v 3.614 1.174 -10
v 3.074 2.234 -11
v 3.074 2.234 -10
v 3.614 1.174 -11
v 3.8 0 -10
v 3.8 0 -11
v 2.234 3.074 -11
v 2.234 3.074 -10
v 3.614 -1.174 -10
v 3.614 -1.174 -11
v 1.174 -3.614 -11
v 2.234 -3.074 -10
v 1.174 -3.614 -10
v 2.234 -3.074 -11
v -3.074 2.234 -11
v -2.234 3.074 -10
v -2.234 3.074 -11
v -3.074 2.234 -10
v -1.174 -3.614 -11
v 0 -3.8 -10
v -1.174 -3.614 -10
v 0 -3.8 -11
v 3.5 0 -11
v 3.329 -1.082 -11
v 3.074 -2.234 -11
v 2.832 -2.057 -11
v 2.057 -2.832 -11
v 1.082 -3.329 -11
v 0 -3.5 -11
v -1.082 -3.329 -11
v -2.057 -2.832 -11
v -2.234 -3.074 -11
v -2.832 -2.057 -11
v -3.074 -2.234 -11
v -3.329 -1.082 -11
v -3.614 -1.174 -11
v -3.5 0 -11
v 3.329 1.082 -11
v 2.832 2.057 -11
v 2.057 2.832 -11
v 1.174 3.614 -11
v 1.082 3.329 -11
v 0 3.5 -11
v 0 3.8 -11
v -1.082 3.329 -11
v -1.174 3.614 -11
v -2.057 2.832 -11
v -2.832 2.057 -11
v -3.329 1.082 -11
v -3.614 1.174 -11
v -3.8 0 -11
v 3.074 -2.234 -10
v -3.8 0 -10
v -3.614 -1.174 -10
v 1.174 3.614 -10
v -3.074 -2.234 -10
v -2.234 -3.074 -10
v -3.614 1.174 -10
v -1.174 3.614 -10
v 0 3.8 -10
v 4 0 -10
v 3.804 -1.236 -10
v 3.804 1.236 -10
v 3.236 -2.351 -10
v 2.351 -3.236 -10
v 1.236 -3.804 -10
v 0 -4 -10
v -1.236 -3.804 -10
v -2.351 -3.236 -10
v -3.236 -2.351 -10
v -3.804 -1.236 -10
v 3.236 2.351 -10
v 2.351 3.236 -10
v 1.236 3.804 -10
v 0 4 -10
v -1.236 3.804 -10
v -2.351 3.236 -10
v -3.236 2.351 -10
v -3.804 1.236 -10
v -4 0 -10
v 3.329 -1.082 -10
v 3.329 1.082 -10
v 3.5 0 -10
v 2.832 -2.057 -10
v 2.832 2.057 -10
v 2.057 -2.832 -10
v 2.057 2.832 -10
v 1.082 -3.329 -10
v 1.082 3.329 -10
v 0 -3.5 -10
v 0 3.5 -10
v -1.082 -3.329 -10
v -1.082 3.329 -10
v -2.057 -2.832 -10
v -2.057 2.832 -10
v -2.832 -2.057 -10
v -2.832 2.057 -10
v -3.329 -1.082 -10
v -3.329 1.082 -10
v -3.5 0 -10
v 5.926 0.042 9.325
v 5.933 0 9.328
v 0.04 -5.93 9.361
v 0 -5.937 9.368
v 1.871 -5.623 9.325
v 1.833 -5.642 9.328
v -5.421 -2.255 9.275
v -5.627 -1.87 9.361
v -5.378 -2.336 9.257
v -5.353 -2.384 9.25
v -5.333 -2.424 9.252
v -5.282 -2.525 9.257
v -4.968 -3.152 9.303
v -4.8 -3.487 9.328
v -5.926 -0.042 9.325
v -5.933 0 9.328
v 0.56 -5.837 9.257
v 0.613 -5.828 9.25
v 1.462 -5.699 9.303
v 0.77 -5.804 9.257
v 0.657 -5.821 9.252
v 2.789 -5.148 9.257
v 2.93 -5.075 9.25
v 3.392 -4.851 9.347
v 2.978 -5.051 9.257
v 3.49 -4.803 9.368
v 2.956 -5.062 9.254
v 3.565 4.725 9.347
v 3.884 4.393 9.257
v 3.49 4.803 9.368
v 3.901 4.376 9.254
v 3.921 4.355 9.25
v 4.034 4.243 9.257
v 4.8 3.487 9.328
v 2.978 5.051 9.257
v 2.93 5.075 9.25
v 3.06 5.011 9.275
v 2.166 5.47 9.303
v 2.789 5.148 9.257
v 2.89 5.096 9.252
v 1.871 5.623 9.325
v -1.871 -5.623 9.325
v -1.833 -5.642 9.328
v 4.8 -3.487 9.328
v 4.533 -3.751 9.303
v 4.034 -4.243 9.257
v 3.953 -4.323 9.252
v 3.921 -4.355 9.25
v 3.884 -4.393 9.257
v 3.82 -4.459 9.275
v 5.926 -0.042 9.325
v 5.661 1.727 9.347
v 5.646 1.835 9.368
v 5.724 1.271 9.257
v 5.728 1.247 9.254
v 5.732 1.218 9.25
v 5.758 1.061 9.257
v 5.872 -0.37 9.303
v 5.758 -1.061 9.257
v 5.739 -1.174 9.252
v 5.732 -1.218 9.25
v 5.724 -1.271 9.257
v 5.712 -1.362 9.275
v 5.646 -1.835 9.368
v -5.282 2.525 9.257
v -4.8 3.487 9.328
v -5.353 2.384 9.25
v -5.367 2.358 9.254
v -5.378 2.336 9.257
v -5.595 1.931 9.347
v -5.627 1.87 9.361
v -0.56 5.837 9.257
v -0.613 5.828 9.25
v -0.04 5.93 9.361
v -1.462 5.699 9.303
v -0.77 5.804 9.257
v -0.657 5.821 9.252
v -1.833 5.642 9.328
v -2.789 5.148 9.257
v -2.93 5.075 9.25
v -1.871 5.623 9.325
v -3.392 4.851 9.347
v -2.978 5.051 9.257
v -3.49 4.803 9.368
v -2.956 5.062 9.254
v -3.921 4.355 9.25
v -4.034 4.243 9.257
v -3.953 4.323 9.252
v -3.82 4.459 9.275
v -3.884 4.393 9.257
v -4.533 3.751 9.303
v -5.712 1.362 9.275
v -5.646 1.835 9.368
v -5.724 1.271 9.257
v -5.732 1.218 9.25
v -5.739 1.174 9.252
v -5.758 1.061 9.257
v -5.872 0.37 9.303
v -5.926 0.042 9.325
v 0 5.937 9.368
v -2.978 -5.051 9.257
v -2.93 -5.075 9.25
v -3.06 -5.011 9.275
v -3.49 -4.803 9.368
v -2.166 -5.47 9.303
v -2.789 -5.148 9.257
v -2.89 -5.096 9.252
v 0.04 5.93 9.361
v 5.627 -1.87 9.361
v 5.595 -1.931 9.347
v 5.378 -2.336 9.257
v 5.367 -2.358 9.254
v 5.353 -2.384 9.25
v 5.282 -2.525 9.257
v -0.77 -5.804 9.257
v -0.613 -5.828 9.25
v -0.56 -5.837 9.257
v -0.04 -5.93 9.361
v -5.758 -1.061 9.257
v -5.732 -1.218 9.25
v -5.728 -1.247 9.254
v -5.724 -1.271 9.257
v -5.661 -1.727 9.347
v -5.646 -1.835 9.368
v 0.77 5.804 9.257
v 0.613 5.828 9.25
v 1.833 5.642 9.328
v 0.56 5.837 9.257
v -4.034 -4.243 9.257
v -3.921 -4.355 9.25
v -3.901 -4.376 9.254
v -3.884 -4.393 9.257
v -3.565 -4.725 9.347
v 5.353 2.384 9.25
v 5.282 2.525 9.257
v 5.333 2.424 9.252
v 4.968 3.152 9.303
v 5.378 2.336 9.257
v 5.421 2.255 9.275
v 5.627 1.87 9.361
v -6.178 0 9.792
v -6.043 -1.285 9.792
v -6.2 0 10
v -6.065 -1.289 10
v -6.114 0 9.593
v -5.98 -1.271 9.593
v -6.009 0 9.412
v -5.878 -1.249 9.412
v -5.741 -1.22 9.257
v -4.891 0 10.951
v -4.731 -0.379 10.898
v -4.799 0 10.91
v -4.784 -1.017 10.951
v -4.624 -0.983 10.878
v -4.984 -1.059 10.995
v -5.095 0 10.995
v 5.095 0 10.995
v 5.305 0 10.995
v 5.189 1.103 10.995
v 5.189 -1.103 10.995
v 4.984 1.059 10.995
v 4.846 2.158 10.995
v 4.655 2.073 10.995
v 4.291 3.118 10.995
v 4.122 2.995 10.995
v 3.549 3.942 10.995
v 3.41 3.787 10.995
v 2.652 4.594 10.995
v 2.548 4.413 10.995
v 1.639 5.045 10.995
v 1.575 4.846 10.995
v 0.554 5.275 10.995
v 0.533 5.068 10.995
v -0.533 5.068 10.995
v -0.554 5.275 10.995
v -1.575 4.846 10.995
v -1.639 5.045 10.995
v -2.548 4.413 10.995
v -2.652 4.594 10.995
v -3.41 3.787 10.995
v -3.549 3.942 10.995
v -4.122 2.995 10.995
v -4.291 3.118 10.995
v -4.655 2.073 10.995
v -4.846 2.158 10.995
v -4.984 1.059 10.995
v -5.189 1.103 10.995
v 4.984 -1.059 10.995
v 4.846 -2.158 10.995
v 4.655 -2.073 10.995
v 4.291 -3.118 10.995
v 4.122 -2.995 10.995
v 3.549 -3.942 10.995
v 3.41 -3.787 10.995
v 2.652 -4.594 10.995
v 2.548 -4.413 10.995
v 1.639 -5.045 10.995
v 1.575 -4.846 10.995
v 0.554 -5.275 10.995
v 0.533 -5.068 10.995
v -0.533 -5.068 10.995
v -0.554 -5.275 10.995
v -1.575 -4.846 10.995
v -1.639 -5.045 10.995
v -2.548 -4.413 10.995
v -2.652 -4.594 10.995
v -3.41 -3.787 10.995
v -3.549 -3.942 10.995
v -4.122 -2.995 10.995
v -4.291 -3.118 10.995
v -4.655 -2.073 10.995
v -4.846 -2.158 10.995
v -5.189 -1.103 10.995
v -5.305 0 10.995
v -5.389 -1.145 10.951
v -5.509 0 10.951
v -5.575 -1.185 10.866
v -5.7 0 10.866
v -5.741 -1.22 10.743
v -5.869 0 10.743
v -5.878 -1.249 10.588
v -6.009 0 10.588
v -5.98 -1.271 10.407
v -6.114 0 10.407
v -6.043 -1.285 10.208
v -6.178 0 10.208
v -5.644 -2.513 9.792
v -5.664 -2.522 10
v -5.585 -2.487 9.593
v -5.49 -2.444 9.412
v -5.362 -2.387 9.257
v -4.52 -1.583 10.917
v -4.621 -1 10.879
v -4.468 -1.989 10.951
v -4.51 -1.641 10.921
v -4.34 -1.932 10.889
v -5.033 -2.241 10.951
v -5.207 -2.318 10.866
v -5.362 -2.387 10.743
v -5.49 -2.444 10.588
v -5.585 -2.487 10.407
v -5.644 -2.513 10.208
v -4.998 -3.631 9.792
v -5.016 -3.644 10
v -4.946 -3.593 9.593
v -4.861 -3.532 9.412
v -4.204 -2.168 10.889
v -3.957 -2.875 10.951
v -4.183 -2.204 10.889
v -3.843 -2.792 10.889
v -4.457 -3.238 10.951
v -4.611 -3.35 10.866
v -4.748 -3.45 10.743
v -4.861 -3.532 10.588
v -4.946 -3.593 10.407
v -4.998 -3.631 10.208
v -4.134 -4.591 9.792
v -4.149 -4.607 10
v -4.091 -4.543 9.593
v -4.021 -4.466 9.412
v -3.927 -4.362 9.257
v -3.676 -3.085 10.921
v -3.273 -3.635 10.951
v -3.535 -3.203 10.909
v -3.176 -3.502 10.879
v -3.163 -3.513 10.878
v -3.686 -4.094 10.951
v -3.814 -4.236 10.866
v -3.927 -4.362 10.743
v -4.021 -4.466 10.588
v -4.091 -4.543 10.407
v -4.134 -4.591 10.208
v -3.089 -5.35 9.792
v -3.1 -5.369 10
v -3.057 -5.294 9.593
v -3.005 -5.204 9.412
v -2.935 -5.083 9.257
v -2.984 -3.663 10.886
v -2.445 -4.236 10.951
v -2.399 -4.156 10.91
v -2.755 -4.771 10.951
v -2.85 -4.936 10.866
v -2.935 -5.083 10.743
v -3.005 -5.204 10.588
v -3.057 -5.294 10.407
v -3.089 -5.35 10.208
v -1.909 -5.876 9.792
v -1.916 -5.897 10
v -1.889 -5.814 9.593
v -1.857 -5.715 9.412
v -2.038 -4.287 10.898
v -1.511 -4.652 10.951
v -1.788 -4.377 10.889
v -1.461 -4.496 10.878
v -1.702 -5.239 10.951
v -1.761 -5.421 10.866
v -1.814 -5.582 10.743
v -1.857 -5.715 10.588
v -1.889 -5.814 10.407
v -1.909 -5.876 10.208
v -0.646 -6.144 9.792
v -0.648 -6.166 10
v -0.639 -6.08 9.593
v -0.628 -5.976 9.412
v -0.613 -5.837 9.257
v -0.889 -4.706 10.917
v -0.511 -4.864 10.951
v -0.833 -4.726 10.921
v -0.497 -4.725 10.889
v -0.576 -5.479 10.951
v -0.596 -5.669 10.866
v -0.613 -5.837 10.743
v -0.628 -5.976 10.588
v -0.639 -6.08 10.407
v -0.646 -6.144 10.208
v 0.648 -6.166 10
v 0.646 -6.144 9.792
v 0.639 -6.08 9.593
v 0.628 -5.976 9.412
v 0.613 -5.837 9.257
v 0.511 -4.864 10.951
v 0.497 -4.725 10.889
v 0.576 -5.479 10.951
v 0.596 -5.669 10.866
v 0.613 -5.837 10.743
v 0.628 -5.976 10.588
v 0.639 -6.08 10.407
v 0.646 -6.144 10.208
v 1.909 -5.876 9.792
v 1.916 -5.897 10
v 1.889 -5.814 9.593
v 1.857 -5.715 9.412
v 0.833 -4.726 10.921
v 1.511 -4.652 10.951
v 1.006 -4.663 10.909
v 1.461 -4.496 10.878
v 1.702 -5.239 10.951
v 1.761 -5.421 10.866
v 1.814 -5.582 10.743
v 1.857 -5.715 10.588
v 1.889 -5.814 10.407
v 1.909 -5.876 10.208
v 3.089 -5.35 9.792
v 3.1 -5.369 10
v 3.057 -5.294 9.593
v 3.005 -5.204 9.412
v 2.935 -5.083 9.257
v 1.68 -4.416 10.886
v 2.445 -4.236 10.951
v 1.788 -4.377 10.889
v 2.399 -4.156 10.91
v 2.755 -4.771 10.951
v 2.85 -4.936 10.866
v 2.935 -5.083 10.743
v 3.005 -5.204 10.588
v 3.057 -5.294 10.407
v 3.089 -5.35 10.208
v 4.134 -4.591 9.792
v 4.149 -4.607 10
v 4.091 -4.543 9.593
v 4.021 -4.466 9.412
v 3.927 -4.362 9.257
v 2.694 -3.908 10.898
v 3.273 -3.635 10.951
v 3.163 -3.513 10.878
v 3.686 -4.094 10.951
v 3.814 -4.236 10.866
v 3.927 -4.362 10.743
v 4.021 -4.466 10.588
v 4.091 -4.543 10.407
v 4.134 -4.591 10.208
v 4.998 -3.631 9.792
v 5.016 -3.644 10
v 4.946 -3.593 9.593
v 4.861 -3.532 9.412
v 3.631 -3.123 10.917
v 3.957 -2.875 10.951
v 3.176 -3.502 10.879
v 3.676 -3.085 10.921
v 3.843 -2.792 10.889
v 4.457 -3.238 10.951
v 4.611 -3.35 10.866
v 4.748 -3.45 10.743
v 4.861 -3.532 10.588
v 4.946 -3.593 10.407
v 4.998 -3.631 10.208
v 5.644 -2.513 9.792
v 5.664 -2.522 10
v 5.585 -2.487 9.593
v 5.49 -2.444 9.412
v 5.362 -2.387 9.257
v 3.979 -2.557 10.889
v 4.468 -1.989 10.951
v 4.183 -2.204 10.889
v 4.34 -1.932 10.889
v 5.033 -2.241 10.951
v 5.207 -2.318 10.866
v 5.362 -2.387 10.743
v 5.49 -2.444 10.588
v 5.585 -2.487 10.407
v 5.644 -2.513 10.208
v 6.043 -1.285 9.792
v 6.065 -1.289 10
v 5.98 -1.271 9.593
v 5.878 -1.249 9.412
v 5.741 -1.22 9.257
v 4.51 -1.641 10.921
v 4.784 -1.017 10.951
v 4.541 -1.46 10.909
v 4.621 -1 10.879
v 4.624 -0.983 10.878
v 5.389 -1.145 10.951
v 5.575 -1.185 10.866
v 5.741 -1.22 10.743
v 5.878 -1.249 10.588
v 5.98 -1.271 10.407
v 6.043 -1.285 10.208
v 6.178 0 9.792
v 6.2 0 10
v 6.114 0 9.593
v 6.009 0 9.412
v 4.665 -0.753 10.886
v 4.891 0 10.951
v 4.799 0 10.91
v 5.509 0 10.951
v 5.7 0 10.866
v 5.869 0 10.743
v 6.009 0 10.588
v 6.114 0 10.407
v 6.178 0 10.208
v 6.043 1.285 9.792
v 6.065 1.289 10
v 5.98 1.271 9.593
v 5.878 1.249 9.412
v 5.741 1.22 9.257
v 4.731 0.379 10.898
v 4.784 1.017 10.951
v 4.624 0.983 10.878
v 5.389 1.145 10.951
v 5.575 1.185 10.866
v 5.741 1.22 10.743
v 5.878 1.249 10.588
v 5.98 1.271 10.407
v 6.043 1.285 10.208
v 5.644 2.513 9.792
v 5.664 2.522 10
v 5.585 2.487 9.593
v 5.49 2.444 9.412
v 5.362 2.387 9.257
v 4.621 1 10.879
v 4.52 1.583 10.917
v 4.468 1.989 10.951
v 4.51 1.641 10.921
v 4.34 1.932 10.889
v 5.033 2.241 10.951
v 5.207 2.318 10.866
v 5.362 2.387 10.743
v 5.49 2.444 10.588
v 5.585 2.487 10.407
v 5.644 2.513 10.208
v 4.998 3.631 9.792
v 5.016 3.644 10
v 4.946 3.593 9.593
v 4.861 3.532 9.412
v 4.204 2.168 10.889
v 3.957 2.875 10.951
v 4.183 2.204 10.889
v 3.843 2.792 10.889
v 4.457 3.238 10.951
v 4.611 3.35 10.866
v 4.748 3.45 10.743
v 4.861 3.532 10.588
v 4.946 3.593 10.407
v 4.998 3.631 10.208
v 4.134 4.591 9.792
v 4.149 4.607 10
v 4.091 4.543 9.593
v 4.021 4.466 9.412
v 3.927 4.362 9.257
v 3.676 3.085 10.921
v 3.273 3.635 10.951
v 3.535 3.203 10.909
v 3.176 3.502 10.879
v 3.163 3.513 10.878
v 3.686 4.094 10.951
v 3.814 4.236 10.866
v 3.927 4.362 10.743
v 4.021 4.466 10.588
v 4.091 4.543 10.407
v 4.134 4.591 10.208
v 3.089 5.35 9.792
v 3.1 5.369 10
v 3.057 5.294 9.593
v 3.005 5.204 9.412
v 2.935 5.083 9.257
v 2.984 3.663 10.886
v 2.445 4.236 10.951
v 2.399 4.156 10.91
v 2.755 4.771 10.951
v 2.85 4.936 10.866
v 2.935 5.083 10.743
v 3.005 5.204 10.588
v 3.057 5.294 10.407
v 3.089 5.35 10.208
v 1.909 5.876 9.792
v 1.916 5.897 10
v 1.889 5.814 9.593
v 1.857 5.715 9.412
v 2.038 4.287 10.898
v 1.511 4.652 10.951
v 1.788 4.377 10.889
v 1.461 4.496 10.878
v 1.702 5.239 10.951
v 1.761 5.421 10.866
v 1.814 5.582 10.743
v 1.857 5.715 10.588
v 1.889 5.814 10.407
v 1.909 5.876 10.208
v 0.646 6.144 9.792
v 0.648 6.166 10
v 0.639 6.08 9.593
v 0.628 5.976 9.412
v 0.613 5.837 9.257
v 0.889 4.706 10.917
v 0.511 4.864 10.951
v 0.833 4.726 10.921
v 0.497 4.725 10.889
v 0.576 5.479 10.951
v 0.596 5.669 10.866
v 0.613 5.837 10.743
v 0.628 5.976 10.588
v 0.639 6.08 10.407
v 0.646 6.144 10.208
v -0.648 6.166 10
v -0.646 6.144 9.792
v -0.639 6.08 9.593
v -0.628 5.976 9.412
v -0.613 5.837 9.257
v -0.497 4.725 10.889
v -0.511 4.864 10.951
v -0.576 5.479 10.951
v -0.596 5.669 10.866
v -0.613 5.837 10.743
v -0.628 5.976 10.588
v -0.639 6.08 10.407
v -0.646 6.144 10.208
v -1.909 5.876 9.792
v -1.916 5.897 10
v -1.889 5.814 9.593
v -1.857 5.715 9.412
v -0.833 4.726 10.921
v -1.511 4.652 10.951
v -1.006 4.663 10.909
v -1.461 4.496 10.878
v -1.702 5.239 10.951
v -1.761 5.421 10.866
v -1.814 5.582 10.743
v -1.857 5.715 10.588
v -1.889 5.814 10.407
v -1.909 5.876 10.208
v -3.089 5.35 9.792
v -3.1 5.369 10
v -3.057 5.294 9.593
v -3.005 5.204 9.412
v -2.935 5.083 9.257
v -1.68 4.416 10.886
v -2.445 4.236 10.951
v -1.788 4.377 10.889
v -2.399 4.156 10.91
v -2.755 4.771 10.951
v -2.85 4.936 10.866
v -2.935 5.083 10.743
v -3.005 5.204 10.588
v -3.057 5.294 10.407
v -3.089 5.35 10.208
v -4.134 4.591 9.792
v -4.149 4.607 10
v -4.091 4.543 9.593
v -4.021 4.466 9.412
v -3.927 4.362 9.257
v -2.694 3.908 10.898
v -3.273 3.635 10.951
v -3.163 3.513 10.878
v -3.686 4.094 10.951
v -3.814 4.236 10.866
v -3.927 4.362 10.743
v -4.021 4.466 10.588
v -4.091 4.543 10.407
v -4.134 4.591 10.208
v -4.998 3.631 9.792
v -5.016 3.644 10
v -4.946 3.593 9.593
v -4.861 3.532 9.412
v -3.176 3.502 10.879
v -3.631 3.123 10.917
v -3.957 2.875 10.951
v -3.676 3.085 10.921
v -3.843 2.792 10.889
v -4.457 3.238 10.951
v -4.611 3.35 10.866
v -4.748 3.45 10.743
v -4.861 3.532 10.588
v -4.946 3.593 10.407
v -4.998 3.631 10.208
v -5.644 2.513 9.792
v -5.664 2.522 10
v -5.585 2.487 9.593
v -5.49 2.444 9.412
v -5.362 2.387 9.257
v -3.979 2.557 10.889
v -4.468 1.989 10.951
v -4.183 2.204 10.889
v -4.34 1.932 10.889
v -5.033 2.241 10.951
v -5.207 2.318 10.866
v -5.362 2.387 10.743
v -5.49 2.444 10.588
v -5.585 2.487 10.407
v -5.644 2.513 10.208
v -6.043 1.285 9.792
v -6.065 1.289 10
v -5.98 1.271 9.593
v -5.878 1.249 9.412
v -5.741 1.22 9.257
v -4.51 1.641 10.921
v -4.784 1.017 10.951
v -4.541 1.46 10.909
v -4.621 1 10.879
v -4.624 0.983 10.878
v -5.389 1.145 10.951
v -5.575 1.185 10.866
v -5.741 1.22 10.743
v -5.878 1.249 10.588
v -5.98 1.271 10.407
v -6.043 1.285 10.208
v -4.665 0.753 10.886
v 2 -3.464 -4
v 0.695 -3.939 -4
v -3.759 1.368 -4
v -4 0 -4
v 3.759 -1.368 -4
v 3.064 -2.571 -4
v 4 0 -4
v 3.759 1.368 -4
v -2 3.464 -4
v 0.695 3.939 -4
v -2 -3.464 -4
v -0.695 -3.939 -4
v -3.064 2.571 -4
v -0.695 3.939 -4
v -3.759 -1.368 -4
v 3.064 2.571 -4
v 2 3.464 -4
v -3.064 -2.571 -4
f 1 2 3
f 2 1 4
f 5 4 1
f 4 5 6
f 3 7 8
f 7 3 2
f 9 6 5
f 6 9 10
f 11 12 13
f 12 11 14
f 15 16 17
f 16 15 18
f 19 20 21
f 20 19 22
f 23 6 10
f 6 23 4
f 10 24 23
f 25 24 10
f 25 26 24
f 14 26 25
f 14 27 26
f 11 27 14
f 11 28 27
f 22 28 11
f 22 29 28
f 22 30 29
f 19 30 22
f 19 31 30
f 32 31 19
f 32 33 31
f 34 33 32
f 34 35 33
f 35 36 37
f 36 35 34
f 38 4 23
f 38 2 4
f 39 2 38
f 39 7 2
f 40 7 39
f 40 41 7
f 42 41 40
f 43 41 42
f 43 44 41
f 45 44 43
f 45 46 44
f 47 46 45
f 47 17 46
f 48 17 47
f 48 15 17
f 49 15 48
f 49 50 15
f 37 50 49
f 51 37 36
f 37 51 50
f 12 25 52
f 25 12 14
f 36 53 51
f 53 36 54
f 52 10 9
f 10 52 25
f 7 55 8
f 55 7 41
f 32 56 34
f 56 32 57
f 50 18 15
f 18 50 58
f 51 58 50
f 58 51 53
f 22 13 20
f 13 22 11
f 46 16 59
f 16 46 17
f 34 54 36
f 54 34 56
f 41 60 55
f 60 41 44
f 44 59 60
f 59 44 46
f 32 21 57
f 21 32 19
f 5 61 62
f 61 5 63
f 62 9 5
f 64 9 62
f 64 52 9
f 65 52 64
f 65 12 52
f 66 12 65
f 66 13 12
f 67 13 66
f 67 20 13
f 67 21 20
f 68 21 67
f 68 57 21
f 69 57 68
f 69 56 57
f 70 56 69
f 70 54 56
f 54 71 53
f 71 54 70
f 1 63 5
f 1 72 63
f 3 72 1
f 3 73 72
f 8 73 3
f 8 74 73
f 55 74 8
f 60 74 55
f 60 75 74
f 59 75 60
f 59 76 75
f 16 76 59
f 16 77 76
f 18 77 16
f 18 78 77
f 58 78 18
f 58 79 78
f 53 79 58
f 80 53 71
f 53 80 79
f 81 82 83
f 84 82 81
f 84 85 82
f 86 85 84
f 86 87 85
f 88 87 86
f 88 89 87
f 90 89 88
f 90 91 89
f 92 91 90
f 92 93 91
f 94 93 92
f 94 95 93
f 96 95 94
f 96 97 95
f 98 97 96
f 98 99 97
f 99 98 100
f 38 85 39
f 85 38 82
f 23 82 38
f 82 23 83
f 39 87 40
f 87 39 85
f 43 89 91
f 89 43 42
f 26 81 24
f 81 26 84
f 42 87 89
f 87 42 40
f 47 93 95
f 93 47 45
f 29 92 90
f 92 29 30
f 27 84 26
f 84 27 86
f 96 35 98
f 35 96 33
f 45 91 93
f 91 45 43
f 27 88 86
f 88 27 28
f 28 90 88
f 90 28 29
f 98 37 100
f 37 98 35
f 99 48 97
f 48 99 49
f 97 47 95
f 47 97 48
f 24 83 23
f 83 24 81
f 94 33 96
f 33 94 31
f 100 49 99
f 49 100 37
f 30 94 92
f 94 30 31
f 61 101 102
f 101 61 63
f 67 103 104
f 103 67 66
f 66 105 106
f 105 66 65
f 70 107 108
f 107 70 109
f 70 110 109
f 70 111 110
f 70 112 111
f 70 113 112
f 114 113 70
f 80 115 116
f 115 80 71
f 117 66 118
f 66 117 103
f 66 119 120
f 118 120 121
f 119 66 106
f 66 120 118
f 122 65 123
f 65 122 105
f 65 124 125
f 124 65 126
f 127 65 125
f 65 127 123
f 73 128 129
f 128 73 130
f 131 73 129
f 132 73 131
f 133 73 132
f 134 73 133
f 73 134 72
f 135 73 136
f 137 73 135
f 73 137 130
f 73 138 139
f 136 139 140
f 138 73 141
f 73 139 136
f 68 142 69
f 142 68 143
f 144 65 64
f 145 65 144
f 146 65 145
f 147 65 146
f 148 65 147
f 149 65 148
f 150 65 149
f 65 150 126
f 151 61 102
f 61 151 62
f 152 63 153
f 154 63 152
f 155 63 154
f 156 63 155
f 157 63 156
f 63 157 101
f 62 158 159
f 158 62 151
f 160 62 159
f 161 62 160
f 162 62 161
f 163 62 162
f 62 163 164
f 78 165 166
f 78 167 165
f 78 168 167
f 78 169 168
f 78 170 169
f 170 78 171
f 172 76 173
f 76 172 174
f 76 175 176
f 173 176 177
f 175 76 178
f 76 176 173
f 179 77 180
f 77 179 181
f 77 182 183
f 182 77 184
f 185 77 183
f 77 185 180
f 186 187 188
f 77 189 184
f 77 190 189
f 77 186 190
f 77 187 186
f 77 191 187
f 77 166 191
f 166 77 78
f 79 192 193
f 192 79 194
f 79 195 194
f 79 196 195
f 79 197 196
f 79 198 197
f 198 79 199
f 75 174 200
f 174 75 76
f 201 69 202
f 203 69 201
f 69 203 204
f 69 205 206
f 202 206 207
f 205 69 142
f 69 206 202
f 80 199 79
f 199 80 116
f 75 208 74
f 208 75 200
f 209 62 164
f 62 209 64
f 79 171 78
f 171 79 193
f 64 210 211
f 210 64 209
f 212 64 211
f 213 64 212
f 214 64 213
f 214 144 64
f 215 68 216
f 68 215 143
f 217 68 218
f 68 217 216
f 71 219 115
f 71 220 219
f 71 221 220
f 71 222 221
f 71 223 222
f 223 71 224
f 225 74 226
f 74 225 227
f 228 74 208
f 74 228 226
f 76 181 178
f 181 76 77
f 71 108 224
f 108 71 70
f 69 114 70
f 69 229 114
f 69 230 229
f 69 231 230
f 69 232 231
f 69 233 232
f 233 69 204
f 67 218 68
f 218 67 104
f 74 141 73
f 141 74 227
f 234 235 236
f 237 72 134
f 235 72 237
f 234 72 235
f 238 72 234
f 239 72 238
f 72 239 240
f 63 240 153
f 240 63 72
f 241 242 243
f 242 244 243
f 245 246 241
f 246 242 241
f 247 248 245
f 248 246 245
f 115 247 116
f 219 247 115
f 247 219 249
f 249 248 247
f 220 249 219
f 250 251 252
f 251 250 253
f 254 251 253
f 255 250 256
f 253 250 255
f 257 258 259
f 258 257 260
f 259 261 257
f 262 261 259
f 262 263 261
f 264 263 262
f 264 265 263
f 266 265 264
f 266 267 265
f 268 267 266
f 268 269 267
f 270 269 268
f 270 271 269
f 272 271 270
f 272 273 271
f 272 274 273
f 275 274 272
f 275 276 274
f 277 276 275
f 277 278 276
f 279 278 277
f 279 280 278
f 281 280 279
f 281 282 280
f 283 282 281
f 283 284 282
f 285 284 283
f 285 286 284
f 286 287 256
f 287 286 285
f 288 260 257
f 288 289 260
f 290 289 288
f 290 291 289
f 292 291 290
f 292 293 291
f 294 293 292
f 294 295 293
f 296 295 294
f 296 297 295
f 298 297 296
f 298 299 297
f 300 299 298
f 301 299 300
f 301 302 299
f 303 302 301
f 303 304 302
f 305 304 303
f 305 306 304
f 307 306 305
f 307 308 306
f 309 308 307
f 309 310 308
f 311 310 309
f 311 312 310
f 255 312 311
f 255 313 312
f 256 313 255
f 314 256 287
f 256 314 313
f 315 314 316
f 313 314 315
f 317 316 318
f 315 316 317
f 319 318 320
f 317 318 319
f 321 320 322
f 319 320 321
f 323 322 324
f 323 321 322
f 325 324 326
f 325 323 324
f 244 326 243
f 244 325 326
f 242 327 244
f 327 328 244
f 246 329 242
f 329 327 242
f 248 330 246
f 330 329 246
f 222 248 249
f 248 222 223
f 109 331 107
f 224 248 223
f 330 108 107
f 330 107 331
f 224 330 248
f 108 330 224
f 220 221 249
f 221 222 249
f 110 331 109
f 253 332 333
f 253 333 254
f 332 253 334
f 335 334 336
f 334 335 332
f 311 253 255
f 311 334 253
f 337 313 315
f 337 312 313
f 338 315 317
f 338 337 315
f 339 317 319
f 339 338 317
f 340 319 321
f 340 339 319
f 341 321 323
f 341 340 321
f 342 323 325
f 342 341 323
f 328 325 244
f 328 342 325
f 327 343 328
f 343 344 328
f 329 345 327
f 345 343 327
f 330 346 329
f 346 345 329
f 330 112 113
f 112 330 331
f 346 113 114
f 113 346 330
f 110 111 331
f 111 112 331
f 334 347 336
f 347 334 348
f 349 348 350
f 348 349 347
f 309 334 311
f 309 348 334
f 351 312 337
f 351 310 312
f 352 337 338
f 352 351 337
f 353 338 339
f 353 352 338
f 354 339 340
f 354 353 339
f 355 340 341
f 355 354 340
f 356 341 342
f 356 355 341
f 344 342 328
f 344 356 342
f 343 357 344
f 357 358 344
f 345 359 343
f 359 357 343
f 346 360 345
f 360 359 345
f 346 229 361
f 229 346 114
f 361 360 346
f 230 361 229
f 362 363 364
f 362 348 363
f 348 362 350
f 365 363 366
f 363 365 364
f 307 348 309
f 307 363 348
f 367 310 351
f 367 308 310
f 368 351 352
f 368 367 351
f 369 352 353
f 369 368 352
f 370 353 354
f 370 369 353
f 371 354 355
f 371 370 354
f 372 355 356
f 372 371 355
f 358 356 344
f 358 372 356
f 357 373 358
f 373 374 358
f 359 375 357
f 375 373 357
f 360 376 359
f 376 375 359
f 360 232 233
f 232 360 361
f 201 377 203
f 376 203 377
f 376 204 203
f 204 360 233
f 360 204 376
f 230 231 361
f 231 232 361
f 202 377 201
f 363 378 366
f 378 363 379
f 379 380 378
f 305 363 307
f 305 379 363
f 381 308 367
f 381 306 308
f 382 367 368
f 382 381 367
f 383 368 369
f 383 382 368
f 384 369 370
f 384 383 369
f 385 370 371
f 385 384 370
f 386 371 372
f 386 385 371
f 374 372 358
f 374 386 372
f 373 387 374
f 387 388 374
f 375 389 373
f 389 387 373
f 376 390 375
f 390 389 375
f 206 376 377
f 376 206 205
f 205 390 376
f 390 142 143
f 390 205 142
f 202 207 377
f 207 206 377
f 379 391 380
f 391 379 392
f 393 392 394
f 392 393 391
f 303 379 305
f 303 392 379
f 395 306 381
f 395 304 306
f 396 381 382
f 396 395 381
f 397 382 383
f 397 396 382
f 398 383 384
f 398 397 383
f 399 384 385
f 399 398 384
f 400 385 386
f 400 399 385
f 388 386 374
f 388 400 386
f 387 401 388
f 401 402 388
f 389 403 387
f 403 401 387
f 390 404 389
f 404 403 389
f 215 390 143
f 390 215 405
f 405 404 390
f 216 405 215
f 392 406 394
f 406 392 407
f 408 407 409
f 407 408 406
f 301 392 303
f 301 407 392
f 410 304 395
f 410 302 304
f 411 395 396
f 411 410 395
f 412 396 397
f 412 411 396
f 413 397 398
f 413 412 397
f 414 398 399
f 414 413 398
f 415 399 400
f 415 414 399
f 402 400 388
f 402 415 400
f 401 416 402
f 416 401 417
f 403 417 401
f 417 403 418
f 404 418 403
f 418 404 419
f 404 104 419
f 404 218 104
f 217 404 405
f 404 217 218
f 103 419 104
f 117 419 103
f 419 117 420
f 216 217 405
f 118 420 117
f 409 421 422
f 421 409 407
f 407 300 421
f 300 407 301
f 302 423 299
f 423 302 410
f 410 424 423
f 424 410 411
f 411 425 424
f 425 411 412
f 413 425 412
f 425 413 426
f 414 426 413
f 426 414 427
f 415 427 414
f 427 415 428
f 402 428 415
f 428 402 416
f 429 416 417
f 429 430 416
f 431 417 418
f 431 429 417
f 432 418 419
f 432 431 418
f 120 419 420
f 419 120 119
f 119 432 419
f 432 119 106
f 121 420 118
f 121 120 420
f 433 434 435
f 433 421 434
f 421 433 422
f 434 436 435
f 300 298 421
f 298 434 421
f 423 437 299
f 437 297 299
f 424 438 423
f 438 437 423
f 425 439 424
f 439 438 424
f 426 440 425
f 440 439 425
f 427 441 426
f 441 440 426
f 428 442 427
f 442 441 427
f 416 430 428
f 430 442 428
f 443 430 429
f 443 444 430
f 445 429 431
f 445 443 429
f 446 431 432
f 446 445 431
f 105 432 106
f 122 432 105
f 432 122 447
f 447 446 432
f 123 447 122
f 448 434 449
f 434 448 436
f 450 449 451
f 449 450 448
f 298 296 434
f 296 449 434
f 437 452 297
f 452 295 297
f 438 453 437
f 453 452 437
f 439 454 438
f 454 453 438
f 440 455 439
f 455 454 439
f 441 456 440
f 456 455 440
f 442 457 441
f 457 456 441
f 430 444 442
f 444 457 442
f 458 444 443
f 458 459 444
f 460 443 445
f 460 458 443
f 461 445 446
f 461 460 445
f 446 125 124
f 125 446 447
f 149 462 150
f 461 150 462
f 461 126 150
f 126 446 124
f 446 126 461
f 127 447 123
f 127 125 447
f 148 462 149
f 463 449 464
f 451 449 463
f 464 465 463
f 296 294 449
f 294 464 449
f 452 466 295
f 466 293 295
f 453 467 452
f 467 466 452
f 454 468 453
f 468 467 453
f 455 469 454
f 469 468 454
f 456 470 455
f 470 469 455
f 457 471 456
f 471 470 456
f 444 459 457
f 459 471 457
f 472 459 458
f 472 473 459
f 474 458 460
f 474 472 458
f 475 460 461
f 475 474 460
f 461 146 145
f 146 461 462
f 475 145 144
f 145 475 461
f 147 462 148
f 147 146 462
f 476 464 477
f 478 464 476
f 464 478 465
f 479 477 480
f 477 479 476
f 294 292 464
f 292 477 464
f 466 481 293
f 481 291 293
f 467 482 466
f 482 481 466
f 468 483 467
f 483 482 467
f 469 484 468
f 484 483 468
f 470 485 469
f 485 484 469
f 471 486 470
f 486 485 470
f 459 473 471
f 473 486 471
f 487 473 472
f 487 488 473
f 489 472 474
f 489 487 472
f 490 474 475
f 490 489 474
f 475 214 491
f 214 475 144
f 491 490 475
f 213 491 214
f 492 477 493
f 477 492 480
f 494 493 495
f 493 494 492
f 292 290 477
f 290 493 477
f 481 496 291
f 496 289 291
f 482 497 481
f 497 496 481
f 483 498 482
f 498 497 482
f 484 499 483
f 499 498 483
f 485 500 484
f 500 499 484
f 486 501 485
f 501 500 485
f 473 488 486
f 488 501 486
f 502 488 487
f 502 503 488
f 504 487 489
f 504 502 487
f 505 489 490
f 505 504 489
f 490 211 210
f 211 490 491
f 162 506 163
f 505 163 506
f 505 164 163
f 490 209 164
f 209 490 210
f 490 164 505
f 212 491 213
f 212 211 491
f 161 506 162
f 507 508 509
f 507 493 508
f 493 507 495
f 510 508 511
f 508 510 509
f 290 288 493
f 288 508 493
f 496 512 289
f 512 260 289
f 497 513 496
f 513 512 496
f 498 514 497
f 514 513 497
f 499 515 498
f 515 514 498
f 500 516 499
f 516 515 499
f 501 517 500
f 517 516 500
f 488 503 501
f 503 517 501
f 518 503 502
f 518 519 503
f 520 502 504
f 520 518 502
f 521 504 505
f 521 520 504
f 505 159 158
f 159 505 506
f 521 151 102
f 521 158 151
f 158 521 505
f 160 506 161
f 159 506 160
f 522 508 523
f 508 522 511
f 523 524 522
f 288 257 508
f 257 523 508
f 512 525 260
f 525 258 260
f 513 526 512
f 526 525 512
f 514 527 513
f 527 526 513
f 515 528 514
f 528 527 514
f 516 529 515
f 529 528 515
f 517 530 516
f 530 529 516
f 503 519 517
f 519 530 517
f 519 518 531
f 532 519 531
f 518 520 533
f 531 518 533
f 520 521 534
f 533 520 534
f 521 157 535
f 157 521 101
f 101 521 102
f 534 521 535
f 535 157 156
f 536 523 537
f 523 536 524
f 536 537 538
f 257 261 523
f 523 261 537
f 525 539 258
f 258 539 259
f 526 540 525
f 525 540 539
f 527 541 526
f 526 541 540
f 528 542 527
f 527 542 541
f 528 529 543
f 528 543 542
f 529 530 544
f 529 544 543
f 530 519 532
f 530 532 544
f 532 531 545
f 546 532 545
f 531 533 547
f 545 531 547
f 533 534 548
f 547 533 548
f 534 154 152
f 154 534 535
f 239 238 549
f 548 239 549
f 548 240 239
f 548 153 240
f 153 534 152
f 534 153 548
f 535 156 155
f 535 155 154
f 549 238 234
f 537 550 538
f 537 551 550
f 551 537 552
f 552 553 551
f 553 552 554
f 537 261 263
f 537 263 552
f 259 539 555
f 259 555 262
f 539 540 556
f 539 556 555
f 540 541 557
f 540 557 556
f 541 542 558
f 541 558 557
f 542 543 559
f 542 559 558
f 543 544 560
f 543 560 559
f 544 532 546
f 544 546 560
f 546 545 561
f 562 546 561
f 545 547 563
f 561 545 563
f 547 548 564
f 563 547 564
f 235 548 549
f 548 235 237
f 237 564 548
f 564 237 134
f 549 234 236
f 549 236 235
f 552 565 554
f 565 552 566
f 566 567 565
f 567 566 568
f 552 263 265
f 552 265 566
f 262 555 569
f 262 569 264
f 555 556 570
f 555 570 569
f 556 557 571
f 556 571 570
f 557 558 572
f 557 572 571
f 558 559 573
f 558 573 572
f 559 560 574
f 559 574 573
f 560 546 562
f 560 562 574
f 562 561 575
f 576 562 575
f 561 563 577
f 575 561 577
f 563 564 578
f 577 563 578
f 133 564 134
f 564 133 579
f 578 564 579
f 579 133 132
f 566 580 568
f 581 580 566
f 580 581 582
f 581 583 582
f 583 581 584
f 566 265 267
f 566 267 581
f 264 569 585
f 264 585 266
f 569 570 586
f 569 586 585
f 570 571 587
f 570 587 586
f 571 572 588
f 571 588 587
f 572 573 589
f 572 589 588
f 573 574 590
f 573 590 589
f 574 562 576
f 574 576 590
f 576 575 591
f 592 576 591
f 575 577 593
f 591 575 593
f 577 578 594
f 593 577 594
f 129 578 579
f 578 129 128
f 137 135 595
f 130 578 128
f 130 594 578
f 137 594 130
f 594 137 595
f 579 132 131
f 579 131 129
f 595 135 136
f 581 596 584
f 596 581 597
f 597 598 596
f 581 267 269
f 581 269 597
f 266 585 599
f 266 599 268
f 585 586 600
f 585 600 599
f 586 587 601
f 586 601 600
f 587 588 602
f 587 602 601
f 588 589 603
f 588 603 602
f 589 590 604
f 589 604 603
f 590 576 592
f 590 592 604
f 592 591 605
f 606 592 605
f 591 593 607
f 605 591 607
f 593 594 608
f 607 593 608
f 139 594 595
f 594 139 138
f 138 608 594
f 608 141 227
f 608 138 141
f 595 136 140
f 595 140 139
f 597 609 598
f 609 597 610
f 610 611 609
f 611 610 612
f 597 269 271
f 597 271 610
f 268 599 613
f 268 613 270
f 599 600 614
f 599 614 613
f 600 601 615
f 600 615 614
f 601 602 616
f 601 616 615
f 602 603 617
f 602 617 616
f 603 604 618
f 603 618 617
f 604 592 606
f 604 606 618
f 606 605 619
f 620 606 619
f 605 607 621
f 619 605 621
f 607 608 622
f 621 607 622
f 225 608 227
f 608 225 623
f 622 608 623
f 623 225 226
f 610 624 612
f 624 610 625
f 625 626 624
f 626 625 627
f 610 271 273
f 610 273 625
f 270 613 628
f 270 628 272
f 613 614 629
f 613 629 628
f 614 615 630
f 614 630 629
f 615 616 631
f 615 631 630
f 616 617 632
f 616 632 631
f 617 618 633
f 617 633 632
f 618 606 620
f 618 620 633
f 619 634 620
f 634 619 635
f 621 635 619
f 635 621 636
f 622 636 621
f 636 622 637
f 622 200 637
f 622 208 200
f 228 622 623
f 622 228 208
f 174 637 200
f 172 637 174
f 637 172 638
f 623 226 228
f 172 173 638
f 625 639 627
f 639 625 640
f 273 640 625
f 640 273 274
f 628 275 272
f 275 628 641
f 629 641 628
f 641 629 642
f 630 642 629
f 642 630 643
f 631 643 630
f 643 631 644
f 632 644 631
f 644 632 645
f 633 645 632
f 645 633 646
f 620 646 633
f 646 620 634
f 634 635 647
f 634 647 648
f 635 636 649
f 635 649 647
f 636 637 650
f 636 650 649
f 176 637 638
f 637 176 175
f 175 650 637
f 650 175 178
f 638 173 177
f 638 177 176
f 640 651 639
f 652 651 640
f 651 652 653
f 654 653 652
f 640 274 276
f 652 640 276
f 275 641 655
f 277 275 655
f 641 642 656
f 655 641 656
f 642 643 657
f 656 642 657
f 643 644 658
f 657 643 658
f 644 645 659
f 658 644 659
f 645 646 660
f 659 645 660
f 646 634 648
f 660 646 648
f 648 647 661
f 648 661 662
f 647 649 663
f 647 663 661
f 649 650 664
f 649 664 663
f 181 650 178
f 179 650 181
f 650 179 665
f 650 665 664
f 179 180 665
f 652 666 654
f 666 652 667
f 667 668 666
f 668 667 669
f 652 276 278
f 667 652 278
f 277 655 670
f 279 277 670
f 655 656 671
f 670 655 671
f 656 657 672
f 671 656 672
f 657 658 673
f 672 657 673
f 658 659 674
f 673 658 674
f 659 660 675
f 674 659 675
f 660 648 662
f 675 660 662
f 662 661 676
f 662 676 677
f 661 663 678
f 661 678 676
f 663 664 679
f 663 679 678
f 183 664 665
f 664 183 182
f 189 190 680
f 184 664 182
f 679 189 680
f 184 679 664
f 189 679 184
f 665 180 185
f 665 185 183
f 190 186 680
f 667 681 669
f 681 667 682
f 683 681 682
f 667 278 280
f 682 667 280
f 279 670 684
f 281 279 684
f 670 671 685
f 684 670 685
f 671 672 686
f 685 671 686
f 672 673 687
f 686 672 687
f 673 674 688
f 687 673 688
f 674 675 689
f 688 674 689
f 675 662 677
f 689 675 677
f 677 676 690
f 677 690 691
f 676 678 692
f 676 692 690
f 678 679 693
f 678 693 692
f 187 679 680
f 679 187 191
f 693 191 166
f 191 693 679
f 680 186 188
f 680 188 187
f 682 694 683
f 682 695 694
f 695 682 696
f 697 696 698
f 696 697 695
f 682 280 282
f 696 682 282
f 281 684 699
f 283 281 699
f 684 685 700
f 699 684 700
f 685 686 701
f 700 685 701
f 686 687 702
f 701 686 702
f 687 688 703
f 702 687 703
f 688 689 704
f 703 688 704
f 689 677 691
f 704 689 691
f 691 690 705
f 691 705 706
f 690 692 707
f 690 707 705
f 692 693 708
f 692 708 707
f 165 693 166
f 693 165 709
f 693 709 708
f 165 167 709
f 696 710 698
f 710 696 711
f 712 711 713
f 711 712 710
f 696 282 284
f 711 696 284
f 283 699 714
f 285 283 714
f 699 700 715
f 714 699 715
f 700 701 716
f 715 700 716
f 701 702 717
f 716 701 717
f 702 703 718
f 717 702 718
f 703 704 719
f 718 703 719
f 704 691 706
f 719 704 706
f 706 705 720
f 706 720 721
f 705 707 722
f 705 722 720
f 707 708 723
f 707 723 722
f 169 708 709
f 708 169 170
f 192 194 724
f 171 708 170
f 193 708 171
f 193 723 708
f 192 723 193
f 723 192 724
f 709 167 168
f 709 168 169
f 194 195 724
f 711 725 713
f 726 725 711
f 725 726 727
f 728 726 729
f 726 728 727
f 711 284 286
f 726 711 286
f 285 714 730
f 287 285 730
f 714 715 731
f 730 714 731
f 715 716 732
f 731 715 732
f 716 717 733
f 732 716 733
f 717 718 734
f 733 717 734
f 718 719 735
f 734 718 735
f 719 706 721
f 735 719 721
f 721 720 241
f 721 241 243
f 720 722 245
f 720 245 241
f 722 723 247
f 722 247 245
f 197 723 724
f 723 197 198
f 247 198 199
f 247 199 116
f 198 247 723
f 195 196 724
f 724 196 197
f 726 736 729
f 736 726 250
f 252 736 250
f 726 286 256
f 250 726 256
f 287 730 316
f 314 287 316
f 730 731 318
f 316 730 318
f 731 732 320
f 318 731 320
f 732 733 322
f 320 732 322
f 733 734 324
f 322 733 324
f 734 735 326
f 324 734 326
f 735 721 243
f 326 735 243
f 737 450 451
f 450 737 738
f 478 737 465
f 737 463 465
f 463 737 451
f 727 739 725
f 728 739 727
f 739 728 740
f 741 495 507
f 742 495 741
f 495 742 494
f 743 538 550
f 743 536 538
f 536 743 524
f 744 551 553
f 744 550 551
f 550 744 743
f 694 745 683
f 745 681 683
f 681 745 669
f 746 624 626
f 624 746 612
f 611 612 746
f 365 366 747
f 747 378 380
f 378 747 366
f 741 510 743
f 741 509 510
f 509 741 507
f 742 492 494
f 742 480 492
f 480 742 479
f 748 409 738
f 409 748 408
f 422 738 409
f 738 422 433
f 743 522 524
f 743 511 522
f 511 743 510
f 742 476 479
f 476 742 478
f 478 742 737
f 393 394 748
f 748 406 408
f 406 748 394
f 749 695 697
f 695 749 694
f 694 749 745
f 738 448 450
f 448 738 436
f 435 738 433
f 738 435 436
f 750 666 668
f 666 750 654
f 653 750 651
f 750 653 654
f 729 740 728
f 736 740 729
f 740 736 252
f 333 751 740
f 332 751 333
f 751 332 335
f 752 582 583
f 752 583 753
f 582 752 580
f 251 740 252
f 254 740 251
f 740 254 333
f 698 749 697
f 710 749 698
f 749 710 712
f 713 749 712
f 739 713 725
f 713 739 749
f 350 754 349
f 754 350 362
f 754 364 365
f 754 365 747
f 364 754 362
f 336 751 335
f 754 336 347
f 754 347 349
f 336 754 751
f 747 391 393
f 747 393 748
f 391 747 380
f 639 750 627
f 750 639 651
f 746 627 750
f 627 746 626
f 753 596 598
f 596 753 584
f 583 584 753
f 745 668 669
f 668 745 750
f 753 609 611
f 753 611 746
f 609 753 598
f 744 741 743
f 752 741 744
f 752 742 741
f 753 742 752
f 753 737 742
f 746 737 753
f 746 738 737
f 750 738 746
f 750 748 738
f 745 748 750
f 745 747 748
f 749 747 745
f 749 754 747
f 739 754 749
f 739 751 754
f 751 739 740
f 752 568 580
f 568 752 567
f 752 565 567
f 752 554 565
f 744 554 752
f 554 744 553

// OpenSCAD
module Soda_Cup_01(){

    color("#dbceb2"){
    cylinder(20,4,6, center = true, $fn =20);
    }
    
    difference(){
    color("white"){
    translate([0,0,-10.5])
    cylinder(1,3.8,3.8, center = true, $fn =20);
    }
    translate([0,0,-10.5])
    cylinder(2,3.5,3.5, center = true, $fn =20);
    }
    
       
    module Ring(){

    module pipe(raggio,angolo){
    color("#a8b0b2")
    rotate([90,0,0])
    rotate_extrude(angle=angolo, $fn = $preview? 90: 30) 
    translate([5.2, 0, 0])
    circle(r = raggio, $fn = $preview? 90: 30);
    }

    difference(){
       translate([0,0])
       pipe(1,360);

     }
}
   
   color("white"){
   translate([0,0,10])
   rotate([90,0,00])
   Ring();
   }
   


   
   
}

difference(){
    Soda_Cup_01();
    translate([0,0,10])
    cylinder(28,4,5.5, center = true);
   }

// Written by Nicolì Angelo (Gengio) 2024: 
// MIT License

//Permission is hereby granted, free of charge, to any person obtaining a copy of this software and associated documentation files (the "Software"), to deal in the Software without restriction, including without limitation the rights to use, copy, modify, merge, publish, distribute, sublicense, and/or sell copies of the Software, and to permit persons to whom the Software is furnished to do so, subject to the following conditions:

//The above copyright notice and this permission notice shall be included in all copies or substantial portions of the Software.

//THE SOFTWARE IS PROVIDED "AS IS", WITHOUT WARRANTY OF ANY KIND, EXPRESS OR IMPLIED, INCLUDING BUT NOT LIMITED TO THE WARRANTIES OF MERCHANTABILITY, FITNESS FOR A PARTICULAR PURPOSE AND NONINFRINGEMENT. IN NO EVENT SHALL THE AUTHORS OR COPYRIGHT HOLDERS BE LIABLE FOR ANY CLAIM, DAMAGES OR OTHER LIABILITY, WHETHER IN AN ACTION OF CONTRACT, TORT OR OTHERWISE, ARISING FROM, OUT OF OR IN CONNECTION WITH THE SOFTWARE OR THE USE OR OTHER DEALINGS IN THE SOFTWARE.
